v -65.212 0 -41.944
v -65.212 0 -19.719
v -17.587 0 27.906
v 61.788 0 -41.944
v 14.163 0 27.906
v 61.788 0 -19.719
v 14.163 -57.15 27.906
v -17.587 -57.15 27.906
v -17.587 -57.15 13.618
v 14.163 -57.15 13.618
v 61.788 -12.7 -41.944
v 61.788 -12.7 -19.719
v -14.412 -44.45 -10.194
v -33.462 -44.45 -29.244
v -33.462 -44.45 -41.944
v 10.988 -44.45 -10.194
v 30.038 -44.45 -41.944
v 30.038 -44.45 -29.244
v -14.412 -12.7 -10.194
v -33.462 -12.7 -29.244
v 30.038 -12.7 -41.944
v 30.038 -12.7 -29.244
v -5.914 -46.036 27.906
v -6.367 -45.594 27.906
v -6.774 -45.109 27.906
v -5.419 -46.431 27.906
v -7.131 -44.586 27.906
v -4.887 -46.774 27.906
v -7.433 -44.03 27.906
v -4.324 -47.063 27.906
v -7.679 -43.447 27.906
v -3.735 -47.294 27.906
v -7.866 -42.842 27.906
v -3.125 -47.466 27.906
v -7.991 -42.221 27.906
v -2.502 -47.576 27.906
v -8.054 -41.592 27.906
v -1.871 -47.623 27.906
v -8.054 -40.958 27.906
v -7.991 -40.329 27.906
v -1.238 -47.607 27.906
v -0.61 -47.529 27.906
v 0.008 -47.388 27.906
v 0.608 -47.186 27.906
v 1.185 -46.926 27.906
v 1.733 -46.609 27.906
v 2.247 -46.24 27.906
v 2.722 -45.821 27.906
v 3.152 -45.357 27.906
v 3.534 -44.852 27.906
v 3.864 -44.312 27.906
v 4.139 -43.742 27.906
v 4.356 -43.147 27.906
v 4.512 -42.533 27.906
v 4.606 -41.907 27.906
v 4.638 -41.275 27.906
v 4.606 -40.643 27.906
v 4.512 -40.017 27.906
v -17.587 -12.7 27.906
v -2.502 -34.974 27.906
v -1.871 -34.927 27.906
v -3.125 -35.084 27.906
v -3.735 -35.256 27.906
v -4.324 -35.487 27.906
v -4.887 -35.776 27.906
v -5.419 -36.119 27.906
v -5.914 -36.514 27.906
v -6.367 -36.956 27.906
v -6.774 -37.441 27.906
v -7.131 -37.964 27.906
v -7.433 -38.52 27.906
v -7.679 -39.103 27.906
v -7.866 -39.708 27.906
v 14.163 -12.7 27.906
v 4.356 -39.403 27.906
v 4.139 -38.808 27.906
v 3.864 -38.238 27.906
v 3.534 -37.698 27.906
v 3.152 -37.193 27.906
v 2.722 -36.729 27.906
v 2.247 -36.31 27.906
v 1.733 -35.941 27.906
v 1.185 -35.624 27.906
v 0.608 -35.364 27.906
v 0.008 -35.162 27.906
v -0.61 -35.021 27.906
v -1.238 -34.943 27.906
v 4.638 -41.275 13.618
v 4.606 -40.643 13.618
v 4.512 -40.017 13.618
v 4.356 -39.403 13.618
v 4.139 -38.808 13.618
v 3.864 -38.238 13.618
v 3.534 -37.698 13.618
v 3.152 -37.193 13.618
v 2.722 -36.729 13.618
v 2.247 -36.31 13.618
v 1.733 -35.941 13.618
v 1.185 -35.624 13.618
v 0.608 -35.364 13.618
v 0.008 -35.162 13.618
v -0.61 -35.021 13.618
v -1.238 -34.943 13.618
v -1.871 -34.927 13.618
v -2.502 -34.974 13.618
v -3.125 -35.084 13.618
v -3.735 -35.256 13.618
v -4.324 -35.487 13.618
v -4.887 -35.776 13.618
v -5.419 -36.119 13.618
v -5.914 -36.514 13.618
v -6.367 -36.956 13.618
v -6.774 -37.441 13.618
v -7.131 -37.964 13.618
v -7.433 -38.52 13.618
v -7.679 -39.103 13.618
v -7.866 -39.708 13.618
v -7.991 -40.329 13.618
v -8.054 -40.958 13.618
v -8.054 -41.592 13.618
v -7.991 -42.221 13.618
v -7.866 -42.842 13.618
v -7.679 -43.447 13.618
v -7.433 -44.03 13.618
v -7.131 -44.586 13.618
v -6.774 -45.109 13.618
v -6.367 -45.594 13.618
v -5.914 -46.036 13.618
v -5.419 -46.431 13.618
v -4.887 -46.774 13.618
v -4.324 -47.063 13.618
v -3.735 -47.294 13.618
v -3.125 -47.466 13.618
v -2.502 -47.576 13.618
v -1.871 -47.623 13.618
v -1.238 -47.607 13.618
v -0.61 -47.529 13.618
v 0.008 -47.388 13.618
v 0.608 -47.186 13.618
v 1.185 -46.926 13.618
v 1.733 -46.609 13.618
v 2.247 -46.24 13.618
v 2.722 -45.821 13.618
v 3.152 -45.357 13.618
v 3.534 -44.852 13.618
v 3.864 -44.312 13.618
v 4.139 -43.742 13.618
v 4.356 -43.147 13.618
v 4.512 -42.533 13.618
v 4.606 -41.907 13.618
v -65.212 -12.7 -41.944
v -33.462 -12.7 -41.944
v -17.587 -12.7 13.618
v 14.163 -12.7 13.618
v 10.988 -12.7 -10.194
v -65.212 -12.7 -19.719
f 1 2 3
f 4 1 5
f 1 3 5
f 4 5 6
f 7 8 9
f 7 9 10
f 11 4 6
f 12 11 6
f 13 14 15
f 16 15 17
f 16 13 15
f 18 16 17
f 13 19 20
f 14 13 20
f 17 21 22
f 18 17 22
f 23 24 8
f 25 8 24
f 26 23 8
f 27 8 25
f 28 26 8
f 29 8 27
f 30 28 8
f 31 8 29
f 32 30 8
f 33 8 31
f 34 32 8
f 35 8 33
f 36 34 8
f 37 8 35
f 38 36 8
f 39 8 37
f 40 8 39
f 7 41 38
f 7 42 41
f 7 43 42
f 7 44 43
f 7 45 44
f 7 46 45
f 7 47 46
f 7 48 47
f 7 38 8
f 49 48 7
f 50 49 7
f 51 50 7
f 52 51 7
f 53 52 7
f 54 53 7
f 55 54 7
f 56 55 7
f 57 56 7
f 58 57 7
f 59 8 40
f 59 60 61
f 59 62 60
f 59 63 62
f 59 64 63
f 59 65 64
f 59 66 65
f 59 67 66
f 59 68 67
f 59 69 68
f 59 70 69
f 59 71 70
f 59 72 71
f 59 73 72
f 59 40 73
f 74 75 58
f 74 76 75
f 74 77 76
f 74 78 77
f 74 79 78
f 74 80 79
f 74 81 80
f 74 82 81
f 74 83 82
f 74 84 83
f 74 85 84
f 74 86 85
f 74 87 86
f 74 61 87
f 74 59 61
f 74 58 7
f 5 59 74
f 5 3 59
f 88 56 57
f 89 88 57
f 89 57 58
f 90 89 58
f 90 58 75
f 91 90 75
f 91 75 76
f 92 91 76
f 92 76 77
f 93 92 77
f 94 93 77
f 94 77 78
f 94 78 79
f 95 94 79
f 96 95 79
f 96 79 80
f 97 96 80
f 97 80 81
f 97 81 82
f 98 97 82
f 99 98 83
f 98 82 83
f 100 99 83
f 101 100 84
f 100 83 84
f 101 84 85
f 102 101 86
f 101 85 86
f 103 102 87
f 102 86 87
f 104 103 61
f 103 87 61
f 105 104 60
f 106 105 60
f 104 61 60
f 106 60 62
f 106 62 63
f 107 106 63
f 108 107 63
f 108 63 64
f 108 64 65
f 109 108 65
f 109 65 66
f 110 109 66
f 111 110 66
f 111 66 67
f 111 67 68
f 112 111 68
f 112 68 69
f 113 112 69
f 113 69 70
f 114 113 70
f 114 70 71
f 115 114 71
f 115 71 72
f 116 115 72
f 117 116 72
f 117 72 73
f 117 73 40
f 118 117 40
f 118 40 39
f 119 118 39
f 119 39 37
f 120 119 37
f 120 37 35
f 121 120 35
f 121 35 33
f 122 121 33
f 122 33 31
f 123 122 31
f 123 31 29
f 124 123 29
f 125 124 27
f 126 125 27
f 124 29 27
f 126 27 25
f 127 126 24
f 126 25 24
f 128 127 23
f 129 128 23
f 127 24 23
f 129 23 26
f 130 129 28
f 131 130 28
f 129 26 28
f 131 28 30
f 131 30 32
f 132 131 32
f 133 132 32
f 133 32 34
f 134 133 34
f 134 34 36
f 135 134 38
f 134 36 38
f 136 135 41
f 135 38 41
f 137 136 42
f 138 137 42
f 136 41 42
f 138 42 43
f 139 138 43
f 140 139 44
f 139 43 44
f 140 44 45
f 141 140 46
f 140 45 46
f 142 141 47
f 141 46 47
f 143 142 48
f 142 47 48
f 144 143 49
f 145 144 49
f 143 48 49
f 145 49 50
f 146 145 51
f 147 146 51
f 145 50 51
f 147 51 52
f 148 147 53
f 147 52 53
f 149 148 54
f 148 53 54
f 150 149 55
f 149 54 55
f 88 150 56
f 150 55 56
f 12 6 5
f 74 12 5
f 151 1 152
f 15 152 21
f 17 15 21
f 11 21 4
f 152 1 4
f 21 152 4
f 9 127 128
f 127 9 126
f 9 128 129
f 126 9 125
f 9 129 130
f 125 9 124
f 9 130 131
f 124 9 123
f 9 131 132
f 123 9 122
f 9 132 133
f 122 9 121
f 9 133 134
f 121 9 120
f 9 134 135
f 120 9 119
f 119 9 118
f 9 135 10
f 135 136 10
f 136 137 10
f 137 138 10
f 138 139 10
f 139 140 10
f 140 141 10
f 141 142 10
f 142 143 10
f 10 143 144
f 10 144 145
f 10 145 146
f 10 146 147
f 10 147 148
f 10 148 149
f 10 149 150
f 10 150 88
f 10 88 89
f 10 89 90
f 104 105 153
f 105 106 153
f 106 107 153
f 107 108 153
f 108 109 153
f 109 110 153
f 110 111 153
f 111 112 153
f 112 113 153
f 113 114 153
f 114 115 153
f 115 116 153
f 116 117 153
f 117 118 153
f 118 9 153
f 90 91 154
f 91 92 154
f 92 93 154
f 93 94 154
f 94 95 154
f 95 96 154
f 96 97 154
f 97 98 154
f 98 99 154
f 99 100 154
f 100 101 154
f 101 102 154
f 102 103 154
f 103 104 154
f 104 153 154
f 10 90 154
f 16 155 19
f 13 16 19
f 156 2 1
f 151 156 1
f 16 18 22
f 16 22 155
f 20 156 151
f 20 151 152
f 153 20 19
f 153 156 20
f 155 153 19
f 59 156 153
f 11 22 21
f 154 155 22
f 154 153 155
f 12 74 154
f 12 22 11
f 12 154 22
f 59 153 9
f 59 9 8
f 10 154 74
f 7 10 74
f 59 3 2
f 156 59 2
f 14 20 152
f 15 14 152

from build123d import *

# Parameters (mm, degrees)
F1_DEPTH = 12.7
F2_DEPTH = 44.45
F3_W     = 31.75
F3_H     = 14.2875
F4_DEPTH = 44.45
F5_R     = 6.35
F6_DEPTH = 25.4


with BuildPart() as f1:
    # F0 (on Front) → F1 (new body)
    with BuildSketch(Plane.XZ):
        Polygon((30.037765, -41.944019), (61.787765, -41.944019), (61.787765, -19.719019), (14.162765, 27.905981), (-17.587235, 27.905981), (-65.212235, -19.719019), (-65.212235, -41.944019), (-33.462235, -41.944019), (-33.462235, -29.244019), (-14.412235, -10.194019), (-1.712235, -10.194019), (10.987765, -10.194019), (30.037765, -29.244019), align=None)
    extrude(amount=F1_DEPTH)

    # F0 (on Front) → F2 (join)
    with BuildSketch(Plane.XZ):
        Polygon((-33.462235, -41.944019), (30.037765, -41.944019), (30.037765, -29.244019), (10.987765, -10.194019), (-1.712235, -10.194019), (-14.412235, -10.194019), (-33.462235, -29.244019), align=None)
    extrude(amount=F2_DEPTH)

    # F3 (on face) → F4 (join)
    with BuildSketch(Plane.XZ.offset(12.7)):
        with Locations((-1.712235, 20.762231)):
            Rectangle(F3_W, F3_H)
    extrude(amount=F4_DEPTH)

    # F5 (on face) → F6 (cut)
    with BuildSketch(Plane.XY.offset(27.905981)):
        with Locations((-1.712235, -41.275)):
            Circle(F5_R)
    extrude(amount=-F6_DEPTH, mode=Mode.SUBTRACT)


solid = f1.part
